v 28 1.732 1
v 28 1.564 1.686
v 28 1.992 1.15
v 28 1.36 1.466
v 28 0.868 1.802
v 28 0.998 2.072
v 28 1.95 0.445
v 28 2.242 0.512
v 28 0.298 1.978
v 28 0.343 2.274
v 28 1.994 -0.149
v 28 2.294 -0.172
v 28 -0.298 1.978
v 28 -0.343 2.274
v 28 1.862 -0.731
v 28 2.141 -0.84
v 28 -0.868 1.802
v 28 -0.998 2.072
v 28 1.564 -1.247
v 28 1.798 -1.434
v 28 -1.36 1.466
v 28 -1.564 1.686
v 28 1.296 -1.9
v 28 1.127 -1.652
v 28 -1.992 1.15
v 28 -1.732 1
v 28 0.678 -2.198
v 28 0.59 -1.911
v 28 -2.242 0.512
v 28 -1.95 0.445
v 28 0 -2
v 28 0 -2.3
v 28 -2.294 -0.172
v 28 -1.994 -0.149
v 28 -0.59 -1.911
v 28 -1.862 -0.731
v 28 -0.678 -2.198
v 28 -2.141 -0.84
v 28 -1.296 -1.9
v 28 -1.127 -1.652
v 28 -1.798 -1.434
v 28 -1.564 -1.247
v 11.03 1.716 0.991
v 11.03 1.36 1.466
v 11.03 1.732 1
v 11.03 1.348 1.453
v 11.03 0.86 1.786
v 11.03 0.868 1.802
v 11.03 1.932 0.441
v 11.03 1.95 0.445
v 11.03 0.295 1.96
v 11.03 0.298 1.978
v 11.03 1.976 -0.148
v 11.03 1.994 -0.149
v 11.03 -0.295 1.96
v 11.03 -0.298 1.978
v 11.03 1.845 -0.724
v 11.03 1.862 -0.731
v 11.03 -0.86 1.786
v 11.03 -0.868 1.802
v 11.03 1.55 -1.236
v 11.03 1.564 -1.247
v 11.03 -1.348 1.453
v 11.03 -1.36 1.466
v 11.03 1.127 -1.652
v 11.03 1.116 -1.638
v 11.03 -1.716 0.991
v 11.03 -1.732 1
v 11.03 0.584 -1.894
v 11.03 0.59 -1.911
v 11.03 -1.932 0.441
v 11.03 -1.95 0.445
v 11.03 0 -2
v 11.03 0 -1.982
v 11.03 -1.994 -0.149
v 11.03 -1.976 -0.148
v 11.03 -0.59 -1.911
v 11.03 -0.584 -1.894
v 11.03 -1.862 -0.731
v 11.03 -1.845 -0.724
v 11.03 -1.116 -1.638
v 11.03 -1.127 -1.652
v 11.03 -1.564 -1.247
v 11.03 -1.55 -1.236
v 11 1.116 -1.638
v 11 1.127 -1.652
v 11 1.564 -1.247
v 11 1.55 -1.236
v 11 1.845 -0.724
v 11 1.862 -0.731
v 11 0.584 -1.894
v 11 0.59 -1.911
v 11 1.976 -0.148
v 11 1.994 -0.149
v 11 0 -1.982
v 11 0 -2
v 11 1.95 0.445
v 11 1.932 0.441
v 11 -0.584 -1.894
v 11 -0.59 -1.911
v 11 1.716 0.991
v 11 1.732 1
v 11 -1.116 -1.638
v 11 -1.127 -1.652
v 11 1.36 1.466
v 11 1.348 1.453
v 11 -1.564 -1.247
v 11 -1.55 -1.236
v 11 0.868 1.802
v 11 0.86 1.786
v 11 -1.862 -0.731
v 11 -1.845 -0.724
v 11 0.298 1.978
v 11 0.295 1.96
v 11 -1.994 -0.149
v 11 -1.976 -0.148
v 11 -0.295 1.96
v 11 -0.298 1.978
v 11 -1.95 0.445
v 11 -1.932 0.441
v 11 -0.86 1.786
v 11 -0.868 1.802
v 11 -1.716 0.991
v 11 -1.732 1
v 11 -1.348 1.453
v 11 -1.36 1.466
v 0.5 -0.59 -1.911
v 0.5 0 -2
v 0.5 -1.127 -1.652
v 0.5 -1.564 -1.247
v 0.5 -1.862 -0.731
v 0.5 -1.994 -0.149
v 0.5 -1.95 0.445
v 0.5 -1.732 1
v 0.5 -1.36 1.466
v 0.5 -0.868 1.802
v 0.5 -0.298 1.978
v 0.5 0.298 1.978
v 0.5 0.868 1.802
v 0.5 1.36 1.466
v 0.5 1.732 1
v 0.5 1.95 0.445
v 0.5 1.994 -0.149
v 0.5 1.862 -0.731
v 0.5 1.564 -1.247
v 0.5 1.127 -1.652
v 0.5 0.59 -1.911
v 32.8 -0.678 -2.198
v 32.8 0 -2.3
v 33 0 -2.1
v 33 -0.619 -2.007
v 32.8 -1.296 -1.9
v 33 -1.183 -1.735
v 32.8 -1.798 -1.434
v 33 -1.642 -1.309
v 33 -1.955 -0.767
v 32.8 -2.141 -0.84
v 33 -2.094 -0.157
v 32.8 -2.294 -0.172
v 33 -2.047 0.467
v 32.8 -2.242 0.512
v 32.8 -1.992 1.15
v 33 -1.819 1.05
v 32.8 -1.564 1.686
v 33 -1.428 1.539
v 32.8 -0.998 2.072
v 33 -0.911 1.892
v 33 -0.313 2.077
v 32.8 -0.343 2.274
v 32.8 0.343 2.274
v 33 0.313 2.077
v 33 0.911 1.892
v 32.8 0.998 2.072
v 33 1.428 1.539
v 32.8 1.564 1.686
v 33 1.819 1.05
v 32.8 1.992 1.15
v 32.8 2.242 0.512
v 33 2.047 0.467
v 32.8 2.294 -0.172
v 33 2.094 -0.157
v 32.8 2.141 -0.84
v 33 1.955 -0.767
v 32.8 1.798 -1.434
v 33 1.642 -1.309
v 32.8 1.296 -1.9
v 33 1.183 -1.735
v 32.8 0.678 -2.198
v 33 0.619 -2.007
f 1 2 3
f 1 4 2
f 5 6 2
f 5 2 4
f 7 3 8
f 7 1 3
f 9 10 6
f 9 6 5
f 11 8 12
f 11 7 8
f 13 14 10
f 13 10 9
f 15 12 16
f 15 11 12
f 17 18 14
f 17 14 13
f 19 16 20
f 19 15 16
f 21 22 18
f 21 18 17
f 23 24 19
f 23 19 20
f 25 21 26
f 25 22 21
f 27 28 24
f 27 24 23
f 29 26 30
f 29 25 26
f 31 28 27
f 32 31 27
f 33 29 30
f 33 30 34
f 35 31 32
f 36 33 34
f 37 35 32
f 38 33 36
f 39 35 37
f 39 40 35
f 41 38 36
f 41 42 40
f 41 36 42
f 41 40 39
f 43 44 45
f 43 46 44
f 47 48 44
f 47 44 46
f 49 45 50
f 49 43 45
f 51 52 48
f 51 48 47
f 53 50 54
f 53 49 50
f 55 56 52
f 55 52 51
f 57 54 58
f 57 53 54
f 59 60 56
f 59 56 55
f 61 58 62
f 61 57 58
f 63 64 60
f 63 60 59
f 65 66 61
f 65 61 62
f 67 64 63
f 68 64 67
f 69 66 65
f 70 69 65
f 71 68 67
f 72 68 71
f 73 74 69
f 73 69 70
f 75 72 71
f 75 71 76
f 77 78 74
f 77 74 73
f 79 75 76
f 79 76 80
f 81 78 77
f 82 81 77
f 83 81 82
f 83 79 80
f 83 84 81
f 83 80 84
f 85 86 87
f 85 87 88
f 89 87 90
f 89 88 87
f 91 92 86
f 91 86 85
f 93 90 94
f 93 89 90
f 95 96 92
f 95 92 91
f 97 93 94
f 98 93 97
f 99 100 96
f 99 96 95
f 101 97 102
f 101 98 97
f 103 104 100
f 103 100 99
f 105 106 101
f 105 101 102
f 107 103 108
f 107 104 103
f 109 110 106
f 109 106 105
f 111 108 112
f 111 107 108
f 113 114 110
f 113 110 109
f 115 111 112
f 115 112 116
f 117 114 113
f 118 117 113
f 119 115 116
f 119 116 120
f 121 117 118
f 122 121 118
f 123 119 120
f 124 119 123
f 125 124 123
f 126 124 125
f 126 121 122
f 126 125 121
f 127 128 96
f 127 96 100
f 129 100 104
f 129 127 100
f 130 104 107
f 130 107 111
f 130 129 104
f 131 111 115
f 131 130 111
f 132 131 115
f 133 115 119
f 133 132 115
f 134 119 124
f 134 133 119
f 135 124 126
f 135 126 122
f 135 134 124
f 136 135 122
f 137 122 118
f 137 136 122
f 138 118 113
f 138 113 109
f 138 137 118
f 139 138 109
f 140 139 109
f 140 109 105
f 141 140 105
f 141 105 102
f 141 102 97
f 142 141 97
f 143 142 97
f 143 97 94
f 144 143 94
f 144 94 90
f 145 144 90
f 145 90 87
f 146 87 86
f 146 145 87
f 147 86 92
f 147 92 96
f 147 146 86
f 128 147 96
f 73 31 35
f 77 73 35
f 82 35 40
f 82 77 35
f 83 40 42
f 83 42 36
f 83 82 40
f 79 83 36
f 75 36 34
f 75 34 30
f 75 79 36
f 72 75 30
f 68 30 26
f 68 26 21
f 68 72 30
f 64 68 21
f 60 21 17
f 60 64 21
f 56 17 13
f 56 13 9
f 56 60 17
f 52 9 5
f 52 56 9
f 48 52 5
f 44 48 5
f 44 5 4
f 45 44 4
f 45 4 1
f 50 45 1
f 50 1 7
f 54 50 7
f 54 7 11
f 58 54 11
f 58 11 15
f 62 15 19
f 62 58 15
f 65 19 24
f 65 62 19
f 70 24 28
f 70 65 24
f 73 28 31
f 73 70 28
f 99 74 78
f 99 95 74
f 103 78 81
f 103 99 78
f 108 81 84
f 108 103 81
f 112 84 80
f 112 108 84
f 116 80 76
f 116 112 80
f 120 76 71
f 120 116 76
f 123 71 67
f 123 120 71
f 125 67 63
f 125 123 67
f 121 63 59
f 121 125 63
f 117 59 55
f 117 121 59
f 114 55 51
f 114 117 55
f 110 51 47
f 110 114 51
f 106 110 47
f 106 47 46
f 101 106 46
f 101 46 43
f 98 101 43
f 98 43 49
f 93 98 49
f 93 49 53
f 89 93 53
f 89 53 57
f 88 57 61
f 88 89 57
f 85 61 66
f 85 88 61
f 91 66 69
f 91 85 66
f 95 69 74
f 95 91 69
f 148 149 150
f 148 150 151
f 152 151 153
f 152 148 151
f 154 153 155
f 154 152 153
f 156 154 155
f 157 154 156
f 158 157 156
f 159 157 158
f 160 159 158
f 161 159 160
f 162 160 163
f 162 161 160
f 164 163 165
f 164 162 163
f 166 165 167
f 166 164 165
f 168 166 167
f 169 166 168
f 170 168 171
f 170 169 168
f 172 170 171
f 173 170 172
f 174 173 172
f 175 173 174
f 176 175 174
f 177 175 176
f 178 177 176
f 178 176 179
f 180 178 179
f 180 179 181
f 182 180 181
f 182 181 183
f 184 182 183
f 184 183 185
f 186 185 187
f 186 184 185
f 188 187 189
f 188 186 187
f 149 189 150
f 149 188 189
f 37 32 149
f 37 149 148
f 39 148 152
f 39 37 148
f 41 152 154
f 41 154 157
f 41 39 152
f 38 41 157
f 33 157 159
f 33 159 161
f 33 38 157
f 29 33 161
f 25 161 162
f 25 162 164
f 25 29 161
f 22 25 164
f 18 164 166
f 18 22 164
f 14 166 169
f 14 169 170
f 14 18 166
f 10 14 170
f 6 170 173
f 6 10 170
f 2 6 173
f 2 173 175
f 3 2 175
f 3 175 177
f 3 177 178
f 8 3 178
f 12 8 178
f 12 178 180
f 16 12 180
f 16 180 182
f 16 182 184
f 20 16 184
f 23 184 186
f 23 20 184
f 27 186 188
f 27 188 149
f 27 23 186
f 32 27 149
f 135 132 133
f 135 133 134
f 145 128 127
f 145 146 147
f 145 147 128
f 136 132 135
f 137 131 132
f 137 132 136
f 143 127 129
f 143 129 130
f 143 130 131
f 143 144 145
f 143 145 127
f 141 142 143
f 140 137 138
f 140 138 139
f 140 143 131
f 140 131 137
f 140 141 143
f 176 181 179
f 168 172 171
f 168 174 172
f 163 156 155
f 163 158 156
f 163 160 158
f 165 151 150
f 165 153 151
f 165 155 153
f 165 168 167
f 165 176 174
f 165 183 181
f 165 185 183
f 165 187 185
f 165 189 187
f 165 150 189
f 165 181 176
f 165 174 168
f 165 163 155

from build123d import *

# Parameters (mm, degrees)
CHANFRO1_SIZE         = 0.2
ESBO_O5_R             = 2.627342907
CORTE_EXTRUS_O1_DEPTH = 0.5


with BuildPart() as part:
    # Esboço1 → Revolução1 (revolve)
    with BuildSketch(Plane(origin=(0, 0, 0), x_dir=(1, 0, 0), z_dir=(0, 1, 0))):
        Polygon((0, 0), (33, 0), (33, 2.3), (28, 2.3), (28, 2), (11.029645727, 2), (11.029645727, 1.981975223), (11, 1.981975223), (11, 2), (0, 2), align=None)
    revolve(axis=Axis((0, 0, 0), (-1, 0, 0)))

    # Chanfro1
    chanfro1_edges = [part.edges().sort_by_distance(p)[0] for p in [
        (33, 0, 2.3),
    ]]
    chamfer(chanfro1_edges, length=CHANFRO1_SIZE)

    # Esboço5 → Corte-extrusão1 (cut)
    with BuildSketch(Plane.ZY):
        Circle(ESBO_O5_R)
    extrude(amount=-CORTE_EXTRUS_O1_DEPTH, mode=Mode.SUBTRACT)


solid = part.part
